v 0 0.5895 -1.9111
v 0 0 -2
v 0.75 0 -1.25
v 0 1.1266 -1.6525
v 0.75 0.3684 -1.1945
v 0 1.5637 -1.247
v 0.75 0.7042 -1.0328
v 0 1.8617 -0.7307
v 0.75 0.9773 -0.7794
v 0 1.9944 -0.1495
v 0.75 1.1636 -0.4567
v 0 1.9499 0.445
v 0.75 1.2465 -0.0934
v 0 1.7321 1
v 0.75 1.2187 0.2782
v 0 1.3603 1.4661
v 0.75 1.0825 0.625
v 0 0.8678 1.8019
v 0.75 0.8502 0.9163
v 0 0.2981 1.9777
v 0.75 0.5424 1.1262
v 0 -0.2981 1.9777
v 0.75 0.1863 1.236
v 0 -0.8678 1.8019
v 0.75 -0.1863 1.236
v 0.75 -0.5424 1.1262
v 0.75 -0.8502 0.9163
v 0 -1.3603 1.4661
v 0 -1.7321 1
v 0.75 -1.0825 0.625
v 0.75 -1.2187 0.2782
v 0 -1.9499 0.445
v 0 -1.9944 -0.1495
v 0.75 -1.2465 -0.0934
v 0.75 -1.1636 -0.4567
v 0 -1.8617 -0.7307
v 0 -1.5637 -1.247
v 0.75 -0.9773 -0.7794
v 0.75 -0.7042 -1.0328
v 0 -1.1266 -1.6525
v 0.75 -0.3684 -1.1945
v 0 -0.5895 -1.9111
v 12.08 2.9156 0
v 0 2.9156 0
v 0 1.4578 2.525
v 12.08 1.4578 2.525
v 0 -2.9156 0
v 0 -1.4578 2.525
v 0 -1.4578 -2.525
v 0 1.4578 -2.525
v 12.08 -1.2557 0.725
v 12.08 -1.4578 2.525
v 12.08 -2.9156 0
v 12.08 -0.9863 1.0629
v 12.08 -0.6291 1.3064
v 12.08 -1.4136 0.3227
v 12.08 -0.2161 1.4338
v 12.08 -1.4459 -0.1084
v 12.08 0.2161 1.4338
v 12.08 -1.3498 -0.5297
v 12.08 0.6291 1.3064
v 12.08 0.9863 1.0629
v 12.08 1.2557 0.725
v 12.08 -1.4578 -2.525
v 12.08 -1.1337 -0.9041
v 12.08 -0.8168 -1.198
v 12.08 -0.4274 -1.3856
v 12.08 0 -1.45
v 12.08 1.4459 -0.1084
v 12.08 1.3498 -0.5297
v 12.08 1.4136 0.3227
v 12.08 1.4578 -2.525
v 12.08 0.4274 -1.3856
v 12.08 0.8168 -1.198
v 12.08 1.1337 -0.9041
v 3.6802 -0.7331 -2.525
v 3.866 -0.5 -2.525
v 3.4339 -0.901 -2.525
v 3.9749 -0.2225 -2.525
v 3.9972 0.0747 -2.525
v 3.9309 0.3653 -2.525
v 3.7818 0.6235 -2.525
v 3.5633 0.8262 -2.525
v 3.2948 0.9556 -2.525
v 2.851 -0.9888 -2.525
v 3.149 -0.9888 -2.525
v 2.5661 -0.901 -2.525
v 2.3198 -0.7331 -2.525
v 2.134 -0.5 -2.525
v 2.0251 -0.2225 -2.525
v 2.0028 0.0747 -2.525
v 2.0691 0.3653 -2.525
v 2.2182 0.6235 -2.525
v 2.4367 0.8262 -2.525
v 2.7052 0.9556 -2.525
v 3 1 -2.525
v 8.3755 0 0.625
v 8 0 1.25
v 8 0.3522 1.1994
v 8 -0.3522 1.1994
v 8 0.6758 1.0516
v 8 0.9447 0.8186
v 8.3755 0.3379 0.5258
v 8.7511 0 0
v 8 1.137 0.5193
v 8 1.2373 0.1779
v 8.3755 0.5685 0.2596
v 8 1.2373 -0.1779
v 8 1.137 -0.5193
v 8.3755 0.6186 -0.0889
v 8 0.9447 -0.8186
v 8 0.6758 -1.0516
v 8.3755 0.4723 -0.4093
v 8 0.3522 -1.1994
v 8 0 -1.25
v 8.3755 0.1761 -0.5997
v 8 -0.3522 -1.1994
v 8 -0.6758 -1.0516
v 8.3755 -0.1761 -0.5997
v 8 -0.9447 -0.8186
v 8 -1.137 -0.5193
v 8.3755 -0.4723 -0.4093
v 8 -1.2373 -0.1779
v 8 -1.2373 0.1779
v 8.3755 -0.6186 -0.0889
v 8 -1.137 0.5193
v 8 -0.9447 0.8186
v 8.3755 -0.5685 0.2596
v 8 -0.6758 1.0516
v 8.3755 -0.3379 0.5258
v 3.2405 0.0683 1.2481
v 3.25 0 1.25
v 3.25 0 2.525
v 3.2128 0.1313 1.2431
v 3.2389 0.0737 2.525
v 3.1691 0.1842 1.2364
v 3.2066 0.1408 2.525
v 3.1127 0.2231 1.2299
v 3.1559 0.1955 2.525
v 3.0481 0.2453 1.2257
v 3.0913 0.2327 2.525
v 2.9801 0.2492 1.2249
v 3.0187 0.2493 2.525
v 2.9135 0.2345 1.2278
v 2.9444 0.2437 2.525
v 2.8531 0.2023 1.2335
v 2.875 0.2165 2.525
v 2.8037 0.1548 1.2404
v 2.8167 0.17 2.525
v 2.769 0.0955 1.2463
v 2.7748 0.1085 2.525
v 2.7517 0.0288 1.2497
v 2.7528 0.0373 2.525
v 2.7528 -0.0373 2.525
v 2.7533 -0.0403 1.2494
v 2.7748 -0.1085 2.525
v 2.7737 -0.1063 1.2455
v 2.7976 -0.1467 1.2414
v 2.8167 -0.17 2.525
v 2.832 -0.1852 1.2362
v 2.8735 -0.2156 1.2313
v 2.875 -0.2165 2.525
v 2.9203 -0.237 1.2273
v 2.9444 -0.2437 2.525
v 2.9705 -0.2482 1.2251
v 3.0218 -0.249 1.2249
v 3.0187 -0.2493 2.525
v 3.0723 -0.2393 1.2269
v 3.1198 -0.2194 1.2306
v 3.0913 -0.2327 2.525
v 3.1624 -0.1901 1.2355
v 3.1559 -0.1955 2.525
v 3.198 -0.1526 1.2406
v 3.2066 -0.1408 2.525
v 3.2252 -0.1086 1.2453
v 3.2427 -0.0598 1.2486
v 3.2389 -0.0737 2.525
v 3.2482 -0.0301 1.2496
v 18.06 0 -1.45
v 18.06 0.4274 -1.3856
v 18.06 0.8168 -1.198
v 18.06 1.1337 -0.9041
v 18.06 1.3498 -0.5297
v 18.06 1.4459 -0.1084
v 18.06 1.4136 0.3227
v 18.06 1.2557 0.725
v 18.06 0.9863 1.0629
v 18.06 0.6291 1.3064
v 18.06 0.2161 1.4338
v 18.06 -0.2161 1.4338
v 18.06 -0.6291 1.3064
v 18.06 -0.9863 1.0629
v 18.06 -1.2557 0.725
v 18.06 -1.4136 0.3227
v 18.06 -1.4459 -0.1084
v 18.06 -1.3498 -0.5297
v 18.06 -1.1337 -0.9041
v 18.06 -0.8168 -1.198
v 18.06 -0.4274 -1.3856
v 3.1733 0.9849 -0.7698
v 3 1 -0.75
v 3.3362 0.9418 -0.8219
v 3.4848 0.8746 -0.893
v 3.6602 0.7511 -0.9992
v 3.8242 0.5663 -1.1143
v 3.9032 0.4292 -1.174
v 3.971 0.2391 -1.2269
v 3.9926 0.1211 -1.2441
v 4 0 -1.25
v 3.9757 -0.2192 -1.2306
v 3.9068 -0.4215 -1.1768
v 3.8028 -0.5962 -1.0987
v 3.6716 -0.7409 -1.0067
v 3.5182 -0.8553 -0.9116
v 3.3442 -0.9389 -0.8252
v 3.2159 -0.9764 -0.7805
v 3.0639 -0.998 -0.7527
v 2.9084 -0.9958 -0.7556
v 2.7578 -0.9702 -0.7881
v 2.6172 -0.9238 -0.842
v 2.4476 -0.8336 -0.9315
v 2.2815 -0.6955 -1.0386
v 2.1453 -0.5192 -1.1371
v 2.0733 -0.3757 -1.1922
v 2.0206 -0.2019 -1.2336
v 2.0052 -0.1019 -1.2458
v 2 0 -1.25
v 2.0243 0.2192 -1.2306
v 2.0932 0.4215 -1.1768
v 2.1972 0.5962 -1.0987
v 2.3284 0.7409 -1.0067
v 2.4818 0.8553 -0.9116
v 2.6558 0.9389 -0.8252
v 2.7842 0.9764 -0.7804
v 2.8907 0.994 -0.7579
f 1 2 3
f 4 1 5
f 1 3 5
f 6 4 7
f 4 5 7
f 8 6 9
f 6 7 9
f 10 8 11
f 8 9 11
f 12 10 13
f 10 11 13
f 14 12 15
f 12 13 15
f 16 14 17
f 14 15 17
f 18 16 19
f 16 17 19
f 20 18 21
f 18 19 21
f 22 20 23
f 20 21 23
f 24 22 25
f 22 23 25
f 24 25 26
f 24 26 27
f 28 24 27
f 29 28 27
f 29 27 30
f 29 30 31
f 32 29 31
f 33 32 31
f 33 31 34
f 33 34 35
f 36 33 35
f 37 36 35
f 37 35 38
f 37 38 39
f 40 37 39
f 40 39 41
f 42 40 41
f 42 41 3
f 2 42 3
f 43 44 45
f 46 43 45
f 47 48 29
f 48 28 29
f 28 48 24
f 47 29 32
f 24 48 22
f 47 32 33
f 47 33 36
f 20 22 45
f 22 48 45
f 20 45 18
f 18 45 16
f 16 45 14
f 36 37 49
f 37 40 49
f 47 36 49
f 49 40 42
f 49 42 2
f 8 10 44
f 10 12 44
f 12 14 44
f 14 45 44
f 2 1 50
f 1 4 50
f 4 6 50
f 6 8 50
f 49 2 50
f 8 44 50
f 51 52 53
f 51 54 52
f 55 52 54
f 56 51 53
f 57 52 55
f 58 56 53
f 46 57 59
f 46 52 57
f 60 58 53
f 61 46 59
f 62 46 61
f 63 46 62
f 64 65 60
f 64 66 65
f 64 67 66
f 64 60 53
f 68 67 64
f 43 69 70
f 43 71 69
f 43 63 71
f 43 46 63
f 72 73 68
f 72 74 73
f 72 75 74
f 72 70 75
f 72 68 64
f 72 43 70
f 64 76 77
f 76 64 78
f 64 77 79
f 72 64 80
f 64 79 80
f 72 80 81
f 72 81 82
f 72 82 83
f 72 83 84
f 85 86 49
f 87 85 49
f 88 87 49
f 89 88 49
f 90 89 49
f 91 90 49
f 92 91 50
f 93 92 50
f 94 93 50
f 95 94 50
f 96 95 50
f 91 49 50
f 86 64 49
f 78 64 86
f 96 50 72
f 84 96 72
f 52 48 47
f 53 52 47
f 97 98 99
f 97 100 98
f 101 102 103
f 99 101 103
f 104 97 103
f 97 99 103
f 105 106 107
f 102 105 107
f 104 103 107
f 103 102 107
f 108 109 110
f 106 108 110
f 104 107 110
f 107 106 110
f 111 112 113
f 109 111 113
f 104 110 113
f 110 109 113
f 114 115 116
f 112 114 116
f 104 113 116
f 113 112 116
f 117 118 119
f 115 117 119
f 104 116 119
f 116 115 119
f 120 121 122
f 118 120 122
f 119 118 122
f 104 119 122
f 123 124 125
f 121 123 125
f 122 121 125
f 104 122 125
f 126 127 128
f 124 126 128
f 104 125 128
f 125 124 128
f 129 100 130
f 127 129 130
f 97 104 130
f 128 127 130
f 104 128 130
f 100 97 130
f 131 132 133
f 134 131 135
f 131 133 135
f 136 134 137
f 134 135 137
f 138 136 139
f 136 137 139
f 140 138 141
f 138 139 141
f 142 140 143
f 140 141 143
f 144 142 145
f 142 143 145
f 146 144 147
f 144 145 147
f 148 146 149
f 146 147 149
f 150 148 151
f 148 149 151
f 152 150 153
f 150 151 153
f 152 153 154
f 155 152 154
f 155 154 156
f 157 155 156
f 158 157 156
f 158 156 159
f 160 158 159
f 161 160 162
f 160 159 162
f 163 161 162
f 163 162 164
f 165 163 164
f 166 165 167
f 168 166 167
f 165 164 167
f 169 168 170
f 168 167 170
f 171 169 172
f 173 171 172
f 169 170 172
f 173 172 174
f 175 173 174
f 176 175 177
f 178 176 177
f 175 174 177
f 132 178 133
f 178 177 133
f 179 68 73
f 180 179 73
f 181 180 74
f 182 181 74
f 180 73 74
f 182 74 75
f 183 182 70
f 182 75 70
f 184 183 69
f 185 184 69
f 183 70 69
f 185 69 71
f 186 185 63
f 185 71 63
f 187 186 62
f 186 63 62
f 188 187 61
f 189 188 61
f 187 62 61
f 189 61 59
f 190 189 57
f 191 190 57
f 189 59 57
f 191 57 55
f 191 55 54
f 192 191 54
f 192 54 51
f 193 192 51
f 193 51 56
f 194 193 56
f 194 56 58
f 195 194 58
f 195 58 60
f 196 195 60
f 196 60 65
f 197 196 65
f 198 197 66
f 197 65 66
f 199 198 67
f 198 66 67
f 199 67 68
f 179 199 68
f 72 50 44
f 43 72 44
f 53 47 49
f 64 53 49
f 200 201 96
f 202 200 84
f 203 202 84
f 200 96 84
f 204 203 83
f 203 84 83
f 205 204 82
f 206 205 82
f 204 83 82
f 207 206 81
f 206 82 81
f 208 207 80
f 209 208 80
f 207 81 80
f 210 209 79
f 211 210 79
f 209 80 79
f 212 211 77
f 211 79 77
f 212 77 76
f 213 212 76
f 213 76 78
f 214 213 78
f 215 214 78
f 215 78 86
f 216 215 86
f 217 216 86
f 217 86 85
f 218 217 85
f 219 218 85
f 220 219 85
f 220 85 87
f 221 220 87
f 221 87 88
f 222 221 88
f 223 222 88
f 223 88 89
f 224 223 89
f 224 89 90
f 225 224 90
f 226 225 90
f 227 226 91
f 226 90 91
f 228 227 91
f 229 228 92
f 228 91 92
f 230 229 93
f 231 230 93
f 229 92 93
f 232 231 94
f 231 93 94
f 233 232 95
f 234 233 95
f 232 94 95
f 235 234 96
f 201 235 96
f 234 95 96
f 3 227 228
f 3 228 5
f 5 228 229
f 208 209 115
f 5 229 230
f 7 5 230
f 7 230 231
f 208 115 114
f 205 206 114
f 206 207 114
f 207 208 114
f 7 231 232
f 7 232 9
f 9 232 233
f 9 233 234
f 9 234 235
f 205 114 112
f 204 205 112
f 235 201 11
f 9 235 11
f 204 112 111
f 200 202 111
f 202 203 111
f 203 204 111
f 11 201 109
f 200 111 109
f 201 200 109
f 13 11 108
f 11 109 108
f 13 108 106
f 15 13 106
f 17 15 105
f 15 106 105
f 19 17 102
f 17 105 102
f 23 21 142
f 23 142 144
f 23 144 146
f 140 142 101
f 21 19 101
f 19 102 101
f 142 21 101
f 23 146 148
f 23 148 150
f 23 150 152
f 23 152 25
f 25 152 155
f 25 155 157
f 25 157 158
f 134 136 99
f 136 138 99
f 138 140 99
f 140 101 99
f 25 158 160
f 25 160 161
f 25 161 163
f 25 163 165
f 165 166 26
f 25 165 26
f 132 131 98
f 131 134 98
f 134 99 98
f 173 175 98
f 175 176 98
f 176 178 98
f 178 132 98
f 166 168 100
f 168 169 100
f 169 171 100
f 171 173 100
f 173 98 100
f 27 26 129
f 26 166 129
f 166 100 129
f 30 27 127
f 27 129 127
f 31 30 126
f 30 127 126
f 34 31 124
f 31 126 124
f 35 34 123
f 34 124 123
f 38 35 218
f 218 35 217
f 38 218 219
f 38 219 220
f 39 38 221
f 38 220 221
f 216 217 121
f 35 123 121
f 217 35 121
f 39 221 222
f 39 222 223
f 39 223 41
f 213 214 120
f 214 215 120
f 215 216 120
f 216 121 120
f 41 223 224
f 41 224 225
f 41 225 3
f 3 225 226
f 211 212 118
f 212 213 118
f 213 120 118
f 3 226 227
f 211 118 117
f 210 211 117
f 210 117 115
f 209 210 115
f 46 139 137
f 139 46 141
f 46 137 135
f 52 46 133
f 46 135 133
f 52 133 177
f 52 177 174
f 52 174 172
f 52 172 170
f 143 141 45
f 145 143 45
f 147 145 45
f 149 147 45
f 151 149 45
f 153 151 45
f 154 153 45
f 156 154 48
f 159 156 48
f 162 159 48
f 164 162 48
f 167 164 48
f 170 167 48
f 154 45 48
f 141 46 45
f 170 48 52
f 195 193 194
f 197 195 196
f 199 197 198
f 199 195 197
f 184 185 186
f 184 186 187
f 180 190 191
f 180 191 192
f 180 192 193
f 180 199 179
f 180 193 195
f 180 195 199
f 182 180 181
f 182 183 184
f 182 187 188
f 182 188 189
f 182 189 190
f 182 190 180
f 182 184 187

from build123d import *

# Parameters (mm, degrees)
ESTRUSIONE_ESTRUSIONE1_DEPTH        = 12.08
SCHIZZO2_R                          = 1.45
ESTRUSIONE_ESTRUSIONE2_DEPTH        = 5.98
FORO_FILETTATO_M3X0_5_1_D           = 2.5
FORO_FILETTATO_M3X0_5_1_DEPTH       = 8
FORO_FILETTATO_M3X0_5_1_CSINK_D     = 4
FORO_FILETTATO_M3X0_5_1_CSINK_ANGLE = 90
FORO_FILETTATO_M3X0_5_1_TIP         = 0.751075774
TAGLIO_ESTRUSIONE1_REACH            = 20.978
TAGLIO_ESTRUSIONE1_END_RADIUS       = 1.25
SCHIZZO5_R                          = 0.25
TAGLIO_ESTRUSIONE2_REACH            = 20.978
TAGLIO_ESTRUSIONE2_END_RADIUS       = 1.25
SCHIZZO6_R                          = 1


with BuildPart() as part:
    # Schizzo1 → Estrusione-Estrusione1 (new body)
    with BuildSketch(Plane(origin=(0, 0, 0), x_dir=(0, 0, -1), z_dir=(1, 0, 0))):
        Polygon((0, 2.915618859), (-2.525, 1.45780943), (-2.525, -1.45780943), (0, -2.915618859), (2.525, -1.45780943), (2.525, 1.45780943), align=None)
    extrude(amount=ESTRUSIONE_ESTRUSIONE1_DEPTH)

    # Schizzo2 → Estrusione-Estrusione2 (add)
    with BuildSketch(Plane(origin=(12.08, 0, 0), x_dir=(0, 0, -1), z_dir=(1, 0, 0))):
        Circle(SCHIZZO2_R)
    extrude(amount=ESTRUSIONE_ESTRUSIONE2_DEPTH)

    # Foro filettato M3x0.5-1
    with Locations(Plane.ZY):
        with Locations((0, 0)):
            CounterSinkHole(FORO_FILETTATO_M3X0_5_1_D / 2, FORO_FILETTATO_M3X0_5_1_CSINK_D / 2, depth=FORO_FILETTATO_M3X0_5_1_DEPTH, counter_sink_angle=FORO_FILETTATO_M3X0_5_1_CSINK_ANGLE)
            with Locations((0, 0, -(FORO_FILETTATO_M3X0_5_1_DEPTH + FORO_FILETTATO_M3X0_5_1_TIP / 2))):  # 118° drill point
                Cone(0, FORO_FILETTATO_M3X0_5_1_D / 2, FORO_FILETTATO_M3X0_5_1_TIP, mode=Mode.SUBTRACT)

    # Taglio-Estrusione1: up to this cylinder (the profile starts outside it)
    taglio_estrusione1_end = Plane(origin=(3, 0, 0), z_dir=(-1, 0, 0)) * Cylinder(TAGLIO_ESTRUSIONE1_END_RADIUS, 45.456, mode=Mode.PRIVATE)
    # Schizzo5 → Taglio-Estrusione1 (cut, up to the surface)
    with BuildSketch(Plane.XY.offset(2.525), mode=Mode.PRIVATE) as taglio_estrusione1_sk1:
        with Locations((3, 0)):
            Circle(SCHIZZO5_R)
    taglio_estrusione1_tool1 = extrude(taglio_estrusione1_sk1.sketch, amount=-TAGLIO_ESTRUSIONE1_REACH, mode=Mode.PRIVATE) - taglio_estrusione1_end
    add(taglio_estrusione1_tool1.solids().sort_by_distance((3, 0, 2.525))[0], mode=Mode.SUBTRACT)

    # Taglio-Estrusione2: up to this cylinder (the profile starts outside it)
    taglio_estrusione2_end = Plane(origin=(3, 0, 0), z_dir=(-1, 0, 0)) * Cylinder(TAGLIO_ESTRUSIONE2_END_RADIUS, 45.456, mode=Mode.PRIVATE)
    # Schizzo6 → Taglio-Estrusione2 (cut, up to the surface)
    with BuildSketch(Plane(origin=(0, 0, -2.525), x_dir=(-1, 0, 0), z_dir=(0, 0, -1)), mode=Mode.PRIVATE) as taglio_estrusione2_sk1:
        with Locations(Location((-3, 0, 0), (0, 0, 90))):
            Circle(SCHIZZO6_R)
    taglio_estrusione2_tool1 = extrude(taglio_estrusione2_sk1.sketch, amount=-TAGLIO_ESTRUSIONE2_REACH, mode=Mode.PRIVATE) - taglio_estrusione2_end
    add(taglio_estrusione2_tool1.solids().sort_by_distance((3, 0, -2.525))[0], mode=Mode.SUBTRACT)


solid = part.part
